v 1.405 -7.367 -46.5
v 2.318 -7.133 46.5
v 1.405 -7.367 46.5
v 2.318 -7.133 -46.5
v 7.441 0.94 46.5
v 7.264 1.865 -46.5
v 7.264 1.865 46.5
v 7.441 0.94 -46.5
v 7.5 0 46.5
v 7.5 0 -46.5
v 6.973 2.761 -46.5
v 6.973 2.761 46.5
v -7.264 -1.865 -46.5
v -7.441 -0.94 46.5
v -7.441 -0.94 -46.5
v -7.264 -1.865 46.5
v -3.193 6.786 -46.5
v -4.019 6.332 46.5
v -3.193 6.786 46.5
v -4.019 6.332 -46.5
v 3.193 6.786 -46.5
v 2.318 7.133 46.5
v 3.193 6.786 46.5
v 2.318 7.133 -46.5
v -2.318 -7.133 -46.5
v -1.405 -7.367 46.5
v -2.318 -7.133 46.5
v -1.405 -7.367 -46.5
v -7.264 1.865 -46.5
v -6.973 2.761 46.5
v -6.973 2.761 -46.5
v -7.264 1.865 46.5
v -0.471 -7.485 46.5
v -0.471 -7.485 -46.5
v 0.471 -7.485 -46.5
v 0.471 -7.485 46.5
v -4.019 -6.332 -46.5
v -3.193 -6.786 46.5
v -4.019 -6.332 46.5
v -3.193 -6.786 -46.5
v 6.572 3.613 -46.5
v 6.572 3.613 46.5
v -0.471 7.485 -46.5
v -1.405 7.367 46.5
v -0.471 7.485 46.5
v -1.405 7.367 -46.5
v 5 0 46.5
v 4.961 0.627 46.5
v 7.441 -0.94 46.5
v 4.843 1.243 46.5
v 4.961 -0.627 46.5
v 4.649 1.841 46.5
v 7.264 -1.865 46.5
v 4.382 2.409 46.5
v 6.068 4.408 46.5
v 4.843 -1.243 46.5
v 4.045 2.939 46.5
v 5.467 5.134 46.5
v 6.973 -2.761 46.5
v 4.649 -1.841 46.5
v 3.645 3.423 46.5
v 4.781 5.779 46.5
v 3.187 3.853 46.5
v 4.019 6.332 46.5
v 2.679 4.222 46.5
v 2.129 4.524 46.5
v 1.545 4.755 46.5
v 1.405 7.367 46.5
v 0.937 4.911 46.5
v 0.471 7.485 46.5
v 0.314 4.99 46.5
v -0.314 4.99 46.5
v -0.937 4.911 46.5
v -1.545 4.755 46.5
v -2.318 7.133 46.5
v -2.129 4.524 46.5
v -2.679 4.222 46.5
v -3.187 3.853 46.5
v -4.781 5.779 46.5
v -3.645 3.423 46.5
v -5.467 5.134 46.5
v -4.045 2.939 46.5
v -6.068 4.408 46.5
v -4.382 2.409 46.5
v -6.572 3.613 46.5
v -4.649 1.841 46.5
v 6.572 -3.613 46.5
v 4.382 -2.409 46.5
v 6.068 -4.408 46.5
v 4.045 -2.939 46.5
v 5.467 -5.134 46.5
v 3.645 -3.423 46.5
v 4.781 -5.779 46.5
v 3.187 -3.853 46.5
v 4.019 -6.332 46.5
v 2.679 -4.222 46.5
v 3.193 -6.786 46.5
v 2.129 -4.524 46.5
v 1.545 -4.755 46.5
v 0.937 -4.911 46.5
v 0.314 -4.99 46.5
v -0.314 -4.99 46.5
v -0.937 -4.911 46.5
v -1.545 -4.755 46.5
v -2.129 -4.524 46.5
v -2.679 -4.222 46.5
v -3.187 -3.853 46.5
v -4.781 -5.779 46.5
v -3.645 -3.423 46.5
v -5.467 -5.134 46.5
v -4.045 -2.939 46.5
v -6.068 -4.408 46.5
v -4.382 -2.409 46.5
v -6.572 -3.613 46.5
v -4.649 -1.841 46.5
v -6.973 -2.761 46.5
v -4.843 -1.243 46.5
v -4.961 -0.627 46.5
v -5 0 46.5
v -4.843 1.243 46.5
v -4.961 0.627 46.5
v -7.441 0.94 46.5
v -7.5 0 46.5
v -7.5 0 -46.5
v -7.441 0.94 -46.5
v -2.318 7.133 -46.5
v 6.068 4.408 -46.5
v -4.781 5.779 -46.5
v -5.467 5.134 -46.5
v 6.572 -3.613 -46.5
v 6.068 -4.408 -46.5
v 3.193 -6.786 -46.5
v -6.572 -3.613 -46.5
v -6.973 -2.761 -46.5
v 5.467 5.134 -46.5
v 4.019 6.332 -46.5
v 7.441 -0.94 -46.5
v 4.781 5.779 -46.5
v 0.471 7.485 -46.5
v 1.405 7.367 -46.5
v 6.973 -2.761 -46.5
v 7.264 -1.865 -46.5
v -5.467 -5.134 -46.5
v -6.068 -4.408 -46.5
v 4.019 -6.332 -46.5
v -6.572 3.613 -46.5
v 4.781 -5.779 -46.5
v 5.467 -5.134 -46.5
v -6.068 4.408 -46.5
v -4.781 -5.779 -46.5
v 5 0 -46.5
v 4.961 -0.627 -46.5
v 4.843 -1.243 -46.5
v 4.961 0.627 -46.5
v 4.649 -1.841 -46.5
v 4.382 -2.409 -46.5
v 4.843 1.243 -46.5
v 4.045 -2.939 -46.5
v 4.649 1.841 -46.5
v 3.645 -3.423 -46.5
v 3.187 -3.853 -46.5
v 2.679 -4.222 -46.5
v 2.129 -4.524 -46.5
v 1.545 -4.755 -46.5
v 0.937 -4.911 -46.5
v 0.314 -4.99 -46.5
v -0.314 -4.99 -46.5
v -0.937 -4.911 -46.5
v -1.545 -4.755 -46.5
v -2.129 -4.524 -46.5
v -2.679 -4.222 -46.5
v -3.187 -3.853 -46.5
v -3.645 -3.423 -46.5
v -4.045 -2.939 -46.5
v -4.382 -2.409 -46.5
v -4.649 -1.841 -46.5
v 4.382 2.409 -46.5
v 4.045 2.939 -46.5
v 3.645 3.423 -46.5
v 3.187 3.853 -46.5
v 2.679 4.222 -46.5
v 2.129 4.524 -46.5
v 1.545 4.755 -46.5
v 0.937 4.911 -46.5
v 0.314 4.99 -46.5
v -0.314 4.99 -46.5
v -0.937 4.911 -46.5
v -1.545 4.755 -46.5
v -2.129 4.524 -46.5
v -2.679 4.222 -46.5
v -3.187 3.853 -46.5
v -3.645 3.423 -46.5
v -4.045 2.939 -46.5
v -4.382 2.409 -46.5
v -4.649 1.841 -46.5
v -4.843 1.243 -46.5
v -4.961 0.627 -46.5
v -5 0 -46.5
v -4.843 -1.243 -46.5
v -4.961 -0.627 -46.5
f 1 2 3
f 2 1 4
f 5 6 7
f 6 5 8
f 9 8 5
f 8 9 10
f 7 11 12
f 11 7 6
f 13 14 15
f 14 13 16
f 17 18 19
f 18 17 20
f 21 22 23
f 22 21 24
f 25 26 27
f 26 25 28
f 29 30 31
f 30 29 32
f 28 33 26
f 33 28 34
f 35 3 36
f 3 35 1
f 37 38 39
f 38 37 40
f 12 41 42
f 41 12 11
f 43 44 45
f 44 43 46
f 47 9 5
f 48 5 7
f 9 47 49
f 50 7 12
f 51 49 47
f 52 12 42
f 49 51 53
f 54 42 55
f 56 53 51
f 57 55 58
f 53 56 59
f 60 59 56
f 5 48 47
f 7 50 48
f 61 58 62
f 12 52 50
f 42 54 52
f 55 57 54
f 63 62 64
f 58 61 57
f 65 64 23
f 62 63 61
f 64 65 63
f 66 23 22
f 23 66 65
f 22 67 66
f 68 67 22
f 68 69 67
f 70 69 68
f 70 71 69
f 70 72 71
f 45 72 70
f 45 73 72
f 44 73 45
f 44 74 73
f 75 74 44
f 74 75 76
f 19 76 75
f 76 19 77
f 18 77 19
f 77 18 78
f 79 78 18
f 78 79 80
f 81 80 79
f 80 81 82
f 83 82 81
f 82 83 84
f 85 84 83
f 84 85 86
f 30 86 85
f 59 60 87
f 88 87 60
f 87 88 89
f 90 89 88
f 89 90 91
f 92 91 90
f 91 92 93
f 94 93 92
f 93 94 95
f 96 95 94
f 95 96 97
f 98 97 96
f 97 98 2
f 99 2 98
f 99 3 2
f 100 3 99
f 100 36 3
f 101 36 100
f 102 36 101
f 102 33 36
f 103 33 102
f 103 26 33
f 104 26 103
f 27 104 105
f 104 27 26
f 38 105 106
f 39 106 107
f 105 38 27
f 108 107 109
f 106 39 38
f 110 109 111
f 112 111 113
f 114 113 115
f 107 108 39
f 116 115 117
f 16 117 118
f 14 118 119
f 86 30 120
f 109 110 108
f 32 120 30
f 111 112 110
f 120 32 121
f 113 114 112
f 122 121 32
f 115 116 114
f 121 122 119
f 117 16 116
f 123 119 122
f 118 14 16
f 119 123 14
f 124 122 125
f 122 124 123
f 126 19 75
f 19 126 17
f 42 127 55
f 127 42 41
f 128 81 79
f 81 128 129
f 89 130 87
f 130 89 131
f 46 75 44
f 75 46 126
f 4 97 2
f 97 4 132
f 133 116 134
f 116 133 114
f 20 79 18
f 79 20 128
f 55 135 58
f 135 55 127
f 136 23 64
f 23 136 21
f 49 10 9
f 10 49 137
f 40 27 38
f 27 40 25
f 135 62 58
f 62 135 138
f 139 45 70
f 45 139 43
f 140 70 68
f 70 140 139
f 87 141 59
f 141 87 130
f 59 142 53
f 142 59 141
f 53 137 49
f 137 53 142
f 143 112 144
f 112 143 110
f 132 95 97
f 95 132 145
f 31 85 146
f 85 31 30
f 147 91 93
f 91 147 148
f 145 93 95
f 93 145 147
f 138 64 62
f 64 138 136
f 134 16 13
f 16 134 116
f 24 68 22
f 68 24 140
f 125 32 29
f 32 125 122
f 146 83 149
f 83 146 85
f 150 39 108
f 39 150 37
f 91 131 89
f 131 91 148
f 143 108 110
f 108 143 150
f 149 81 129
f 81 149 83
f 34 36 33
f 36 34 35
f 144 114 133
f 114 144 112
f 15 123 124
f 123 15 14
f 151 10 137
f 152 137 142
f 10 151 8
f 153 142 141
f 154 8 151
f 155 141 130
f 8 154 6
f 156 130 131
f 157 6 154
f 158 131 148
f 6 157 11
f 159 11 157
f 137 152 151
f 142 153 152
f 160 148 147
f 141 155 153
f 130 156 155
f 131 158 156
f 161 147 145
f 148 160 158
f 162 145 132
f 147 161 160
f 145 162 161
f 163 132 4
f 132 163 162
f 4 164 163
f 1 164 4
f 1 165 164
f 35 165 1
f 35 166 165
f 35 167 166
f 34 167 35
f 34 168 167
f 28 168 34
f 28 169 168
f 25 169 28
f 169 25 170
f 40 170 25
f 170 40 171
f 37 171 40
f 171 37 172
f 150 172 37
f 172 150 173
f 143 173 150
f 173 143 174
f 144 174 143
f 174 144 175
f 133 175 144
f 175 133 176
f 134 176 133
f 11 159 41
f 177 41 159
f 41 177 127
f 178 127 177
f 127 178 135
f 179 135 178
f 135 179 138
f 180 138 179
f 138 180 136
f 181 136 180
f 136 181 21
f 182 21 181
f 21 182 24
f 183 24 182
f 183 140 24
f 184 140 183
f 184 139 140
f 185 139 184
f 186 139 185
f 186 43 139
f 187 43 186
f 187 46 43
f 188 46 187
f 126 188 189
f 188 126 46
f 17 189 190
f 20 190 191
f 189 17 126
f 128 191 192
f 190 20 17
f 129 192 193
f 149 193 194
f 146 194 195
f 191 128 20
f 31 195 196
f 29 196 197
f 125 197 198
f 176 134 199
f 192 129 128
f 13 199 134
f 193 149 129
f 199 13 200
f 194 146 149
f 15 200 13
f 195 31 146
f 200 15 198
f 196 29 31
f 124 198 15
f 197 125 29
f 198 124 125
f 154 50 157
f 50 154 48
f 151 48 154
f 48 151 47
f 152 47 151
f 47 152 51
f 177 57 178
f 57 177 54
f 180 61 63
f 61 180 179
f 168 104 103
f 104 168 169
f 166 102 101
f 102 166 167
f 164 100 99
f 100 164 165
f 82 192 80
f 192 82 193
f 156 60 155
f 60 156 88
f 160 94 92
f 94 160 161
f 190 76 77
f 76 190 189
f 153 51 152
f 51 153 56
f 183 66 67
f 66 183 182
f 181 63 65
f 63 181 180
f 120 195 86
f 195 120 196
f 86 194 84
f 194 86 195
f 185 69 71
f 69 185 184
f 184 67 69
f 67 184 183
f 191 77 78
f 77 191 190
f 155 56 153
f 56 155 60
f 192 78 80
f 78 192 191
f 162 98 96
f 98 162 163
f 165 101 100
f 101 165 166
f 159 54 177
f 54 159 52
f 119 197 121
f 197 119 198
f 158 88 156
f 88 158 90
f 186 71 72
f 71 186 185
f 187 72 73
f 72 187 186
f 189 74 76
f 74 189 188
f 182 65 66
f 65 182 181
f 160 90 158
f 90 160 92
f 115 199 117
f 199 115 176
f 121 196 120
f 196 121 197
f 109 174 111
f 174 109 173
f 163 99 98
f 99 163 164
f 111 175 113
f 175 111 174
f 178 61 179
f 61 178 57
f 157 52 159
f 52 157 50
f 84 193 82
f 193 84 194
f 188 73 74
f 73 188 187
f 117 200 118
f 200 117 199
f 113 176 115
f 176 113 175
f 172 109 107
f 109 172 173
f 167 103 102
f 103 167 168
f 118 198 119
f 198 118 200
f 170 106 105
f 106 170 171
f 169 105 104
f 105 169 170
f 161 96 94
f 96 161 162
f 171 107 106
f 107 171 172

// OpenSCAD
$fn = 50;


difference() {
	union() {
		translate(v = [0, 0, -46.5000000000]) {
			cylinder(h = 93, r = 7.5000000000);
		}
	}
	union() {
		translate(v = [0, 0, -100.0000000000]) {
			cylinder(h = 200, r = 5.0000000000);
		}
	}
}
